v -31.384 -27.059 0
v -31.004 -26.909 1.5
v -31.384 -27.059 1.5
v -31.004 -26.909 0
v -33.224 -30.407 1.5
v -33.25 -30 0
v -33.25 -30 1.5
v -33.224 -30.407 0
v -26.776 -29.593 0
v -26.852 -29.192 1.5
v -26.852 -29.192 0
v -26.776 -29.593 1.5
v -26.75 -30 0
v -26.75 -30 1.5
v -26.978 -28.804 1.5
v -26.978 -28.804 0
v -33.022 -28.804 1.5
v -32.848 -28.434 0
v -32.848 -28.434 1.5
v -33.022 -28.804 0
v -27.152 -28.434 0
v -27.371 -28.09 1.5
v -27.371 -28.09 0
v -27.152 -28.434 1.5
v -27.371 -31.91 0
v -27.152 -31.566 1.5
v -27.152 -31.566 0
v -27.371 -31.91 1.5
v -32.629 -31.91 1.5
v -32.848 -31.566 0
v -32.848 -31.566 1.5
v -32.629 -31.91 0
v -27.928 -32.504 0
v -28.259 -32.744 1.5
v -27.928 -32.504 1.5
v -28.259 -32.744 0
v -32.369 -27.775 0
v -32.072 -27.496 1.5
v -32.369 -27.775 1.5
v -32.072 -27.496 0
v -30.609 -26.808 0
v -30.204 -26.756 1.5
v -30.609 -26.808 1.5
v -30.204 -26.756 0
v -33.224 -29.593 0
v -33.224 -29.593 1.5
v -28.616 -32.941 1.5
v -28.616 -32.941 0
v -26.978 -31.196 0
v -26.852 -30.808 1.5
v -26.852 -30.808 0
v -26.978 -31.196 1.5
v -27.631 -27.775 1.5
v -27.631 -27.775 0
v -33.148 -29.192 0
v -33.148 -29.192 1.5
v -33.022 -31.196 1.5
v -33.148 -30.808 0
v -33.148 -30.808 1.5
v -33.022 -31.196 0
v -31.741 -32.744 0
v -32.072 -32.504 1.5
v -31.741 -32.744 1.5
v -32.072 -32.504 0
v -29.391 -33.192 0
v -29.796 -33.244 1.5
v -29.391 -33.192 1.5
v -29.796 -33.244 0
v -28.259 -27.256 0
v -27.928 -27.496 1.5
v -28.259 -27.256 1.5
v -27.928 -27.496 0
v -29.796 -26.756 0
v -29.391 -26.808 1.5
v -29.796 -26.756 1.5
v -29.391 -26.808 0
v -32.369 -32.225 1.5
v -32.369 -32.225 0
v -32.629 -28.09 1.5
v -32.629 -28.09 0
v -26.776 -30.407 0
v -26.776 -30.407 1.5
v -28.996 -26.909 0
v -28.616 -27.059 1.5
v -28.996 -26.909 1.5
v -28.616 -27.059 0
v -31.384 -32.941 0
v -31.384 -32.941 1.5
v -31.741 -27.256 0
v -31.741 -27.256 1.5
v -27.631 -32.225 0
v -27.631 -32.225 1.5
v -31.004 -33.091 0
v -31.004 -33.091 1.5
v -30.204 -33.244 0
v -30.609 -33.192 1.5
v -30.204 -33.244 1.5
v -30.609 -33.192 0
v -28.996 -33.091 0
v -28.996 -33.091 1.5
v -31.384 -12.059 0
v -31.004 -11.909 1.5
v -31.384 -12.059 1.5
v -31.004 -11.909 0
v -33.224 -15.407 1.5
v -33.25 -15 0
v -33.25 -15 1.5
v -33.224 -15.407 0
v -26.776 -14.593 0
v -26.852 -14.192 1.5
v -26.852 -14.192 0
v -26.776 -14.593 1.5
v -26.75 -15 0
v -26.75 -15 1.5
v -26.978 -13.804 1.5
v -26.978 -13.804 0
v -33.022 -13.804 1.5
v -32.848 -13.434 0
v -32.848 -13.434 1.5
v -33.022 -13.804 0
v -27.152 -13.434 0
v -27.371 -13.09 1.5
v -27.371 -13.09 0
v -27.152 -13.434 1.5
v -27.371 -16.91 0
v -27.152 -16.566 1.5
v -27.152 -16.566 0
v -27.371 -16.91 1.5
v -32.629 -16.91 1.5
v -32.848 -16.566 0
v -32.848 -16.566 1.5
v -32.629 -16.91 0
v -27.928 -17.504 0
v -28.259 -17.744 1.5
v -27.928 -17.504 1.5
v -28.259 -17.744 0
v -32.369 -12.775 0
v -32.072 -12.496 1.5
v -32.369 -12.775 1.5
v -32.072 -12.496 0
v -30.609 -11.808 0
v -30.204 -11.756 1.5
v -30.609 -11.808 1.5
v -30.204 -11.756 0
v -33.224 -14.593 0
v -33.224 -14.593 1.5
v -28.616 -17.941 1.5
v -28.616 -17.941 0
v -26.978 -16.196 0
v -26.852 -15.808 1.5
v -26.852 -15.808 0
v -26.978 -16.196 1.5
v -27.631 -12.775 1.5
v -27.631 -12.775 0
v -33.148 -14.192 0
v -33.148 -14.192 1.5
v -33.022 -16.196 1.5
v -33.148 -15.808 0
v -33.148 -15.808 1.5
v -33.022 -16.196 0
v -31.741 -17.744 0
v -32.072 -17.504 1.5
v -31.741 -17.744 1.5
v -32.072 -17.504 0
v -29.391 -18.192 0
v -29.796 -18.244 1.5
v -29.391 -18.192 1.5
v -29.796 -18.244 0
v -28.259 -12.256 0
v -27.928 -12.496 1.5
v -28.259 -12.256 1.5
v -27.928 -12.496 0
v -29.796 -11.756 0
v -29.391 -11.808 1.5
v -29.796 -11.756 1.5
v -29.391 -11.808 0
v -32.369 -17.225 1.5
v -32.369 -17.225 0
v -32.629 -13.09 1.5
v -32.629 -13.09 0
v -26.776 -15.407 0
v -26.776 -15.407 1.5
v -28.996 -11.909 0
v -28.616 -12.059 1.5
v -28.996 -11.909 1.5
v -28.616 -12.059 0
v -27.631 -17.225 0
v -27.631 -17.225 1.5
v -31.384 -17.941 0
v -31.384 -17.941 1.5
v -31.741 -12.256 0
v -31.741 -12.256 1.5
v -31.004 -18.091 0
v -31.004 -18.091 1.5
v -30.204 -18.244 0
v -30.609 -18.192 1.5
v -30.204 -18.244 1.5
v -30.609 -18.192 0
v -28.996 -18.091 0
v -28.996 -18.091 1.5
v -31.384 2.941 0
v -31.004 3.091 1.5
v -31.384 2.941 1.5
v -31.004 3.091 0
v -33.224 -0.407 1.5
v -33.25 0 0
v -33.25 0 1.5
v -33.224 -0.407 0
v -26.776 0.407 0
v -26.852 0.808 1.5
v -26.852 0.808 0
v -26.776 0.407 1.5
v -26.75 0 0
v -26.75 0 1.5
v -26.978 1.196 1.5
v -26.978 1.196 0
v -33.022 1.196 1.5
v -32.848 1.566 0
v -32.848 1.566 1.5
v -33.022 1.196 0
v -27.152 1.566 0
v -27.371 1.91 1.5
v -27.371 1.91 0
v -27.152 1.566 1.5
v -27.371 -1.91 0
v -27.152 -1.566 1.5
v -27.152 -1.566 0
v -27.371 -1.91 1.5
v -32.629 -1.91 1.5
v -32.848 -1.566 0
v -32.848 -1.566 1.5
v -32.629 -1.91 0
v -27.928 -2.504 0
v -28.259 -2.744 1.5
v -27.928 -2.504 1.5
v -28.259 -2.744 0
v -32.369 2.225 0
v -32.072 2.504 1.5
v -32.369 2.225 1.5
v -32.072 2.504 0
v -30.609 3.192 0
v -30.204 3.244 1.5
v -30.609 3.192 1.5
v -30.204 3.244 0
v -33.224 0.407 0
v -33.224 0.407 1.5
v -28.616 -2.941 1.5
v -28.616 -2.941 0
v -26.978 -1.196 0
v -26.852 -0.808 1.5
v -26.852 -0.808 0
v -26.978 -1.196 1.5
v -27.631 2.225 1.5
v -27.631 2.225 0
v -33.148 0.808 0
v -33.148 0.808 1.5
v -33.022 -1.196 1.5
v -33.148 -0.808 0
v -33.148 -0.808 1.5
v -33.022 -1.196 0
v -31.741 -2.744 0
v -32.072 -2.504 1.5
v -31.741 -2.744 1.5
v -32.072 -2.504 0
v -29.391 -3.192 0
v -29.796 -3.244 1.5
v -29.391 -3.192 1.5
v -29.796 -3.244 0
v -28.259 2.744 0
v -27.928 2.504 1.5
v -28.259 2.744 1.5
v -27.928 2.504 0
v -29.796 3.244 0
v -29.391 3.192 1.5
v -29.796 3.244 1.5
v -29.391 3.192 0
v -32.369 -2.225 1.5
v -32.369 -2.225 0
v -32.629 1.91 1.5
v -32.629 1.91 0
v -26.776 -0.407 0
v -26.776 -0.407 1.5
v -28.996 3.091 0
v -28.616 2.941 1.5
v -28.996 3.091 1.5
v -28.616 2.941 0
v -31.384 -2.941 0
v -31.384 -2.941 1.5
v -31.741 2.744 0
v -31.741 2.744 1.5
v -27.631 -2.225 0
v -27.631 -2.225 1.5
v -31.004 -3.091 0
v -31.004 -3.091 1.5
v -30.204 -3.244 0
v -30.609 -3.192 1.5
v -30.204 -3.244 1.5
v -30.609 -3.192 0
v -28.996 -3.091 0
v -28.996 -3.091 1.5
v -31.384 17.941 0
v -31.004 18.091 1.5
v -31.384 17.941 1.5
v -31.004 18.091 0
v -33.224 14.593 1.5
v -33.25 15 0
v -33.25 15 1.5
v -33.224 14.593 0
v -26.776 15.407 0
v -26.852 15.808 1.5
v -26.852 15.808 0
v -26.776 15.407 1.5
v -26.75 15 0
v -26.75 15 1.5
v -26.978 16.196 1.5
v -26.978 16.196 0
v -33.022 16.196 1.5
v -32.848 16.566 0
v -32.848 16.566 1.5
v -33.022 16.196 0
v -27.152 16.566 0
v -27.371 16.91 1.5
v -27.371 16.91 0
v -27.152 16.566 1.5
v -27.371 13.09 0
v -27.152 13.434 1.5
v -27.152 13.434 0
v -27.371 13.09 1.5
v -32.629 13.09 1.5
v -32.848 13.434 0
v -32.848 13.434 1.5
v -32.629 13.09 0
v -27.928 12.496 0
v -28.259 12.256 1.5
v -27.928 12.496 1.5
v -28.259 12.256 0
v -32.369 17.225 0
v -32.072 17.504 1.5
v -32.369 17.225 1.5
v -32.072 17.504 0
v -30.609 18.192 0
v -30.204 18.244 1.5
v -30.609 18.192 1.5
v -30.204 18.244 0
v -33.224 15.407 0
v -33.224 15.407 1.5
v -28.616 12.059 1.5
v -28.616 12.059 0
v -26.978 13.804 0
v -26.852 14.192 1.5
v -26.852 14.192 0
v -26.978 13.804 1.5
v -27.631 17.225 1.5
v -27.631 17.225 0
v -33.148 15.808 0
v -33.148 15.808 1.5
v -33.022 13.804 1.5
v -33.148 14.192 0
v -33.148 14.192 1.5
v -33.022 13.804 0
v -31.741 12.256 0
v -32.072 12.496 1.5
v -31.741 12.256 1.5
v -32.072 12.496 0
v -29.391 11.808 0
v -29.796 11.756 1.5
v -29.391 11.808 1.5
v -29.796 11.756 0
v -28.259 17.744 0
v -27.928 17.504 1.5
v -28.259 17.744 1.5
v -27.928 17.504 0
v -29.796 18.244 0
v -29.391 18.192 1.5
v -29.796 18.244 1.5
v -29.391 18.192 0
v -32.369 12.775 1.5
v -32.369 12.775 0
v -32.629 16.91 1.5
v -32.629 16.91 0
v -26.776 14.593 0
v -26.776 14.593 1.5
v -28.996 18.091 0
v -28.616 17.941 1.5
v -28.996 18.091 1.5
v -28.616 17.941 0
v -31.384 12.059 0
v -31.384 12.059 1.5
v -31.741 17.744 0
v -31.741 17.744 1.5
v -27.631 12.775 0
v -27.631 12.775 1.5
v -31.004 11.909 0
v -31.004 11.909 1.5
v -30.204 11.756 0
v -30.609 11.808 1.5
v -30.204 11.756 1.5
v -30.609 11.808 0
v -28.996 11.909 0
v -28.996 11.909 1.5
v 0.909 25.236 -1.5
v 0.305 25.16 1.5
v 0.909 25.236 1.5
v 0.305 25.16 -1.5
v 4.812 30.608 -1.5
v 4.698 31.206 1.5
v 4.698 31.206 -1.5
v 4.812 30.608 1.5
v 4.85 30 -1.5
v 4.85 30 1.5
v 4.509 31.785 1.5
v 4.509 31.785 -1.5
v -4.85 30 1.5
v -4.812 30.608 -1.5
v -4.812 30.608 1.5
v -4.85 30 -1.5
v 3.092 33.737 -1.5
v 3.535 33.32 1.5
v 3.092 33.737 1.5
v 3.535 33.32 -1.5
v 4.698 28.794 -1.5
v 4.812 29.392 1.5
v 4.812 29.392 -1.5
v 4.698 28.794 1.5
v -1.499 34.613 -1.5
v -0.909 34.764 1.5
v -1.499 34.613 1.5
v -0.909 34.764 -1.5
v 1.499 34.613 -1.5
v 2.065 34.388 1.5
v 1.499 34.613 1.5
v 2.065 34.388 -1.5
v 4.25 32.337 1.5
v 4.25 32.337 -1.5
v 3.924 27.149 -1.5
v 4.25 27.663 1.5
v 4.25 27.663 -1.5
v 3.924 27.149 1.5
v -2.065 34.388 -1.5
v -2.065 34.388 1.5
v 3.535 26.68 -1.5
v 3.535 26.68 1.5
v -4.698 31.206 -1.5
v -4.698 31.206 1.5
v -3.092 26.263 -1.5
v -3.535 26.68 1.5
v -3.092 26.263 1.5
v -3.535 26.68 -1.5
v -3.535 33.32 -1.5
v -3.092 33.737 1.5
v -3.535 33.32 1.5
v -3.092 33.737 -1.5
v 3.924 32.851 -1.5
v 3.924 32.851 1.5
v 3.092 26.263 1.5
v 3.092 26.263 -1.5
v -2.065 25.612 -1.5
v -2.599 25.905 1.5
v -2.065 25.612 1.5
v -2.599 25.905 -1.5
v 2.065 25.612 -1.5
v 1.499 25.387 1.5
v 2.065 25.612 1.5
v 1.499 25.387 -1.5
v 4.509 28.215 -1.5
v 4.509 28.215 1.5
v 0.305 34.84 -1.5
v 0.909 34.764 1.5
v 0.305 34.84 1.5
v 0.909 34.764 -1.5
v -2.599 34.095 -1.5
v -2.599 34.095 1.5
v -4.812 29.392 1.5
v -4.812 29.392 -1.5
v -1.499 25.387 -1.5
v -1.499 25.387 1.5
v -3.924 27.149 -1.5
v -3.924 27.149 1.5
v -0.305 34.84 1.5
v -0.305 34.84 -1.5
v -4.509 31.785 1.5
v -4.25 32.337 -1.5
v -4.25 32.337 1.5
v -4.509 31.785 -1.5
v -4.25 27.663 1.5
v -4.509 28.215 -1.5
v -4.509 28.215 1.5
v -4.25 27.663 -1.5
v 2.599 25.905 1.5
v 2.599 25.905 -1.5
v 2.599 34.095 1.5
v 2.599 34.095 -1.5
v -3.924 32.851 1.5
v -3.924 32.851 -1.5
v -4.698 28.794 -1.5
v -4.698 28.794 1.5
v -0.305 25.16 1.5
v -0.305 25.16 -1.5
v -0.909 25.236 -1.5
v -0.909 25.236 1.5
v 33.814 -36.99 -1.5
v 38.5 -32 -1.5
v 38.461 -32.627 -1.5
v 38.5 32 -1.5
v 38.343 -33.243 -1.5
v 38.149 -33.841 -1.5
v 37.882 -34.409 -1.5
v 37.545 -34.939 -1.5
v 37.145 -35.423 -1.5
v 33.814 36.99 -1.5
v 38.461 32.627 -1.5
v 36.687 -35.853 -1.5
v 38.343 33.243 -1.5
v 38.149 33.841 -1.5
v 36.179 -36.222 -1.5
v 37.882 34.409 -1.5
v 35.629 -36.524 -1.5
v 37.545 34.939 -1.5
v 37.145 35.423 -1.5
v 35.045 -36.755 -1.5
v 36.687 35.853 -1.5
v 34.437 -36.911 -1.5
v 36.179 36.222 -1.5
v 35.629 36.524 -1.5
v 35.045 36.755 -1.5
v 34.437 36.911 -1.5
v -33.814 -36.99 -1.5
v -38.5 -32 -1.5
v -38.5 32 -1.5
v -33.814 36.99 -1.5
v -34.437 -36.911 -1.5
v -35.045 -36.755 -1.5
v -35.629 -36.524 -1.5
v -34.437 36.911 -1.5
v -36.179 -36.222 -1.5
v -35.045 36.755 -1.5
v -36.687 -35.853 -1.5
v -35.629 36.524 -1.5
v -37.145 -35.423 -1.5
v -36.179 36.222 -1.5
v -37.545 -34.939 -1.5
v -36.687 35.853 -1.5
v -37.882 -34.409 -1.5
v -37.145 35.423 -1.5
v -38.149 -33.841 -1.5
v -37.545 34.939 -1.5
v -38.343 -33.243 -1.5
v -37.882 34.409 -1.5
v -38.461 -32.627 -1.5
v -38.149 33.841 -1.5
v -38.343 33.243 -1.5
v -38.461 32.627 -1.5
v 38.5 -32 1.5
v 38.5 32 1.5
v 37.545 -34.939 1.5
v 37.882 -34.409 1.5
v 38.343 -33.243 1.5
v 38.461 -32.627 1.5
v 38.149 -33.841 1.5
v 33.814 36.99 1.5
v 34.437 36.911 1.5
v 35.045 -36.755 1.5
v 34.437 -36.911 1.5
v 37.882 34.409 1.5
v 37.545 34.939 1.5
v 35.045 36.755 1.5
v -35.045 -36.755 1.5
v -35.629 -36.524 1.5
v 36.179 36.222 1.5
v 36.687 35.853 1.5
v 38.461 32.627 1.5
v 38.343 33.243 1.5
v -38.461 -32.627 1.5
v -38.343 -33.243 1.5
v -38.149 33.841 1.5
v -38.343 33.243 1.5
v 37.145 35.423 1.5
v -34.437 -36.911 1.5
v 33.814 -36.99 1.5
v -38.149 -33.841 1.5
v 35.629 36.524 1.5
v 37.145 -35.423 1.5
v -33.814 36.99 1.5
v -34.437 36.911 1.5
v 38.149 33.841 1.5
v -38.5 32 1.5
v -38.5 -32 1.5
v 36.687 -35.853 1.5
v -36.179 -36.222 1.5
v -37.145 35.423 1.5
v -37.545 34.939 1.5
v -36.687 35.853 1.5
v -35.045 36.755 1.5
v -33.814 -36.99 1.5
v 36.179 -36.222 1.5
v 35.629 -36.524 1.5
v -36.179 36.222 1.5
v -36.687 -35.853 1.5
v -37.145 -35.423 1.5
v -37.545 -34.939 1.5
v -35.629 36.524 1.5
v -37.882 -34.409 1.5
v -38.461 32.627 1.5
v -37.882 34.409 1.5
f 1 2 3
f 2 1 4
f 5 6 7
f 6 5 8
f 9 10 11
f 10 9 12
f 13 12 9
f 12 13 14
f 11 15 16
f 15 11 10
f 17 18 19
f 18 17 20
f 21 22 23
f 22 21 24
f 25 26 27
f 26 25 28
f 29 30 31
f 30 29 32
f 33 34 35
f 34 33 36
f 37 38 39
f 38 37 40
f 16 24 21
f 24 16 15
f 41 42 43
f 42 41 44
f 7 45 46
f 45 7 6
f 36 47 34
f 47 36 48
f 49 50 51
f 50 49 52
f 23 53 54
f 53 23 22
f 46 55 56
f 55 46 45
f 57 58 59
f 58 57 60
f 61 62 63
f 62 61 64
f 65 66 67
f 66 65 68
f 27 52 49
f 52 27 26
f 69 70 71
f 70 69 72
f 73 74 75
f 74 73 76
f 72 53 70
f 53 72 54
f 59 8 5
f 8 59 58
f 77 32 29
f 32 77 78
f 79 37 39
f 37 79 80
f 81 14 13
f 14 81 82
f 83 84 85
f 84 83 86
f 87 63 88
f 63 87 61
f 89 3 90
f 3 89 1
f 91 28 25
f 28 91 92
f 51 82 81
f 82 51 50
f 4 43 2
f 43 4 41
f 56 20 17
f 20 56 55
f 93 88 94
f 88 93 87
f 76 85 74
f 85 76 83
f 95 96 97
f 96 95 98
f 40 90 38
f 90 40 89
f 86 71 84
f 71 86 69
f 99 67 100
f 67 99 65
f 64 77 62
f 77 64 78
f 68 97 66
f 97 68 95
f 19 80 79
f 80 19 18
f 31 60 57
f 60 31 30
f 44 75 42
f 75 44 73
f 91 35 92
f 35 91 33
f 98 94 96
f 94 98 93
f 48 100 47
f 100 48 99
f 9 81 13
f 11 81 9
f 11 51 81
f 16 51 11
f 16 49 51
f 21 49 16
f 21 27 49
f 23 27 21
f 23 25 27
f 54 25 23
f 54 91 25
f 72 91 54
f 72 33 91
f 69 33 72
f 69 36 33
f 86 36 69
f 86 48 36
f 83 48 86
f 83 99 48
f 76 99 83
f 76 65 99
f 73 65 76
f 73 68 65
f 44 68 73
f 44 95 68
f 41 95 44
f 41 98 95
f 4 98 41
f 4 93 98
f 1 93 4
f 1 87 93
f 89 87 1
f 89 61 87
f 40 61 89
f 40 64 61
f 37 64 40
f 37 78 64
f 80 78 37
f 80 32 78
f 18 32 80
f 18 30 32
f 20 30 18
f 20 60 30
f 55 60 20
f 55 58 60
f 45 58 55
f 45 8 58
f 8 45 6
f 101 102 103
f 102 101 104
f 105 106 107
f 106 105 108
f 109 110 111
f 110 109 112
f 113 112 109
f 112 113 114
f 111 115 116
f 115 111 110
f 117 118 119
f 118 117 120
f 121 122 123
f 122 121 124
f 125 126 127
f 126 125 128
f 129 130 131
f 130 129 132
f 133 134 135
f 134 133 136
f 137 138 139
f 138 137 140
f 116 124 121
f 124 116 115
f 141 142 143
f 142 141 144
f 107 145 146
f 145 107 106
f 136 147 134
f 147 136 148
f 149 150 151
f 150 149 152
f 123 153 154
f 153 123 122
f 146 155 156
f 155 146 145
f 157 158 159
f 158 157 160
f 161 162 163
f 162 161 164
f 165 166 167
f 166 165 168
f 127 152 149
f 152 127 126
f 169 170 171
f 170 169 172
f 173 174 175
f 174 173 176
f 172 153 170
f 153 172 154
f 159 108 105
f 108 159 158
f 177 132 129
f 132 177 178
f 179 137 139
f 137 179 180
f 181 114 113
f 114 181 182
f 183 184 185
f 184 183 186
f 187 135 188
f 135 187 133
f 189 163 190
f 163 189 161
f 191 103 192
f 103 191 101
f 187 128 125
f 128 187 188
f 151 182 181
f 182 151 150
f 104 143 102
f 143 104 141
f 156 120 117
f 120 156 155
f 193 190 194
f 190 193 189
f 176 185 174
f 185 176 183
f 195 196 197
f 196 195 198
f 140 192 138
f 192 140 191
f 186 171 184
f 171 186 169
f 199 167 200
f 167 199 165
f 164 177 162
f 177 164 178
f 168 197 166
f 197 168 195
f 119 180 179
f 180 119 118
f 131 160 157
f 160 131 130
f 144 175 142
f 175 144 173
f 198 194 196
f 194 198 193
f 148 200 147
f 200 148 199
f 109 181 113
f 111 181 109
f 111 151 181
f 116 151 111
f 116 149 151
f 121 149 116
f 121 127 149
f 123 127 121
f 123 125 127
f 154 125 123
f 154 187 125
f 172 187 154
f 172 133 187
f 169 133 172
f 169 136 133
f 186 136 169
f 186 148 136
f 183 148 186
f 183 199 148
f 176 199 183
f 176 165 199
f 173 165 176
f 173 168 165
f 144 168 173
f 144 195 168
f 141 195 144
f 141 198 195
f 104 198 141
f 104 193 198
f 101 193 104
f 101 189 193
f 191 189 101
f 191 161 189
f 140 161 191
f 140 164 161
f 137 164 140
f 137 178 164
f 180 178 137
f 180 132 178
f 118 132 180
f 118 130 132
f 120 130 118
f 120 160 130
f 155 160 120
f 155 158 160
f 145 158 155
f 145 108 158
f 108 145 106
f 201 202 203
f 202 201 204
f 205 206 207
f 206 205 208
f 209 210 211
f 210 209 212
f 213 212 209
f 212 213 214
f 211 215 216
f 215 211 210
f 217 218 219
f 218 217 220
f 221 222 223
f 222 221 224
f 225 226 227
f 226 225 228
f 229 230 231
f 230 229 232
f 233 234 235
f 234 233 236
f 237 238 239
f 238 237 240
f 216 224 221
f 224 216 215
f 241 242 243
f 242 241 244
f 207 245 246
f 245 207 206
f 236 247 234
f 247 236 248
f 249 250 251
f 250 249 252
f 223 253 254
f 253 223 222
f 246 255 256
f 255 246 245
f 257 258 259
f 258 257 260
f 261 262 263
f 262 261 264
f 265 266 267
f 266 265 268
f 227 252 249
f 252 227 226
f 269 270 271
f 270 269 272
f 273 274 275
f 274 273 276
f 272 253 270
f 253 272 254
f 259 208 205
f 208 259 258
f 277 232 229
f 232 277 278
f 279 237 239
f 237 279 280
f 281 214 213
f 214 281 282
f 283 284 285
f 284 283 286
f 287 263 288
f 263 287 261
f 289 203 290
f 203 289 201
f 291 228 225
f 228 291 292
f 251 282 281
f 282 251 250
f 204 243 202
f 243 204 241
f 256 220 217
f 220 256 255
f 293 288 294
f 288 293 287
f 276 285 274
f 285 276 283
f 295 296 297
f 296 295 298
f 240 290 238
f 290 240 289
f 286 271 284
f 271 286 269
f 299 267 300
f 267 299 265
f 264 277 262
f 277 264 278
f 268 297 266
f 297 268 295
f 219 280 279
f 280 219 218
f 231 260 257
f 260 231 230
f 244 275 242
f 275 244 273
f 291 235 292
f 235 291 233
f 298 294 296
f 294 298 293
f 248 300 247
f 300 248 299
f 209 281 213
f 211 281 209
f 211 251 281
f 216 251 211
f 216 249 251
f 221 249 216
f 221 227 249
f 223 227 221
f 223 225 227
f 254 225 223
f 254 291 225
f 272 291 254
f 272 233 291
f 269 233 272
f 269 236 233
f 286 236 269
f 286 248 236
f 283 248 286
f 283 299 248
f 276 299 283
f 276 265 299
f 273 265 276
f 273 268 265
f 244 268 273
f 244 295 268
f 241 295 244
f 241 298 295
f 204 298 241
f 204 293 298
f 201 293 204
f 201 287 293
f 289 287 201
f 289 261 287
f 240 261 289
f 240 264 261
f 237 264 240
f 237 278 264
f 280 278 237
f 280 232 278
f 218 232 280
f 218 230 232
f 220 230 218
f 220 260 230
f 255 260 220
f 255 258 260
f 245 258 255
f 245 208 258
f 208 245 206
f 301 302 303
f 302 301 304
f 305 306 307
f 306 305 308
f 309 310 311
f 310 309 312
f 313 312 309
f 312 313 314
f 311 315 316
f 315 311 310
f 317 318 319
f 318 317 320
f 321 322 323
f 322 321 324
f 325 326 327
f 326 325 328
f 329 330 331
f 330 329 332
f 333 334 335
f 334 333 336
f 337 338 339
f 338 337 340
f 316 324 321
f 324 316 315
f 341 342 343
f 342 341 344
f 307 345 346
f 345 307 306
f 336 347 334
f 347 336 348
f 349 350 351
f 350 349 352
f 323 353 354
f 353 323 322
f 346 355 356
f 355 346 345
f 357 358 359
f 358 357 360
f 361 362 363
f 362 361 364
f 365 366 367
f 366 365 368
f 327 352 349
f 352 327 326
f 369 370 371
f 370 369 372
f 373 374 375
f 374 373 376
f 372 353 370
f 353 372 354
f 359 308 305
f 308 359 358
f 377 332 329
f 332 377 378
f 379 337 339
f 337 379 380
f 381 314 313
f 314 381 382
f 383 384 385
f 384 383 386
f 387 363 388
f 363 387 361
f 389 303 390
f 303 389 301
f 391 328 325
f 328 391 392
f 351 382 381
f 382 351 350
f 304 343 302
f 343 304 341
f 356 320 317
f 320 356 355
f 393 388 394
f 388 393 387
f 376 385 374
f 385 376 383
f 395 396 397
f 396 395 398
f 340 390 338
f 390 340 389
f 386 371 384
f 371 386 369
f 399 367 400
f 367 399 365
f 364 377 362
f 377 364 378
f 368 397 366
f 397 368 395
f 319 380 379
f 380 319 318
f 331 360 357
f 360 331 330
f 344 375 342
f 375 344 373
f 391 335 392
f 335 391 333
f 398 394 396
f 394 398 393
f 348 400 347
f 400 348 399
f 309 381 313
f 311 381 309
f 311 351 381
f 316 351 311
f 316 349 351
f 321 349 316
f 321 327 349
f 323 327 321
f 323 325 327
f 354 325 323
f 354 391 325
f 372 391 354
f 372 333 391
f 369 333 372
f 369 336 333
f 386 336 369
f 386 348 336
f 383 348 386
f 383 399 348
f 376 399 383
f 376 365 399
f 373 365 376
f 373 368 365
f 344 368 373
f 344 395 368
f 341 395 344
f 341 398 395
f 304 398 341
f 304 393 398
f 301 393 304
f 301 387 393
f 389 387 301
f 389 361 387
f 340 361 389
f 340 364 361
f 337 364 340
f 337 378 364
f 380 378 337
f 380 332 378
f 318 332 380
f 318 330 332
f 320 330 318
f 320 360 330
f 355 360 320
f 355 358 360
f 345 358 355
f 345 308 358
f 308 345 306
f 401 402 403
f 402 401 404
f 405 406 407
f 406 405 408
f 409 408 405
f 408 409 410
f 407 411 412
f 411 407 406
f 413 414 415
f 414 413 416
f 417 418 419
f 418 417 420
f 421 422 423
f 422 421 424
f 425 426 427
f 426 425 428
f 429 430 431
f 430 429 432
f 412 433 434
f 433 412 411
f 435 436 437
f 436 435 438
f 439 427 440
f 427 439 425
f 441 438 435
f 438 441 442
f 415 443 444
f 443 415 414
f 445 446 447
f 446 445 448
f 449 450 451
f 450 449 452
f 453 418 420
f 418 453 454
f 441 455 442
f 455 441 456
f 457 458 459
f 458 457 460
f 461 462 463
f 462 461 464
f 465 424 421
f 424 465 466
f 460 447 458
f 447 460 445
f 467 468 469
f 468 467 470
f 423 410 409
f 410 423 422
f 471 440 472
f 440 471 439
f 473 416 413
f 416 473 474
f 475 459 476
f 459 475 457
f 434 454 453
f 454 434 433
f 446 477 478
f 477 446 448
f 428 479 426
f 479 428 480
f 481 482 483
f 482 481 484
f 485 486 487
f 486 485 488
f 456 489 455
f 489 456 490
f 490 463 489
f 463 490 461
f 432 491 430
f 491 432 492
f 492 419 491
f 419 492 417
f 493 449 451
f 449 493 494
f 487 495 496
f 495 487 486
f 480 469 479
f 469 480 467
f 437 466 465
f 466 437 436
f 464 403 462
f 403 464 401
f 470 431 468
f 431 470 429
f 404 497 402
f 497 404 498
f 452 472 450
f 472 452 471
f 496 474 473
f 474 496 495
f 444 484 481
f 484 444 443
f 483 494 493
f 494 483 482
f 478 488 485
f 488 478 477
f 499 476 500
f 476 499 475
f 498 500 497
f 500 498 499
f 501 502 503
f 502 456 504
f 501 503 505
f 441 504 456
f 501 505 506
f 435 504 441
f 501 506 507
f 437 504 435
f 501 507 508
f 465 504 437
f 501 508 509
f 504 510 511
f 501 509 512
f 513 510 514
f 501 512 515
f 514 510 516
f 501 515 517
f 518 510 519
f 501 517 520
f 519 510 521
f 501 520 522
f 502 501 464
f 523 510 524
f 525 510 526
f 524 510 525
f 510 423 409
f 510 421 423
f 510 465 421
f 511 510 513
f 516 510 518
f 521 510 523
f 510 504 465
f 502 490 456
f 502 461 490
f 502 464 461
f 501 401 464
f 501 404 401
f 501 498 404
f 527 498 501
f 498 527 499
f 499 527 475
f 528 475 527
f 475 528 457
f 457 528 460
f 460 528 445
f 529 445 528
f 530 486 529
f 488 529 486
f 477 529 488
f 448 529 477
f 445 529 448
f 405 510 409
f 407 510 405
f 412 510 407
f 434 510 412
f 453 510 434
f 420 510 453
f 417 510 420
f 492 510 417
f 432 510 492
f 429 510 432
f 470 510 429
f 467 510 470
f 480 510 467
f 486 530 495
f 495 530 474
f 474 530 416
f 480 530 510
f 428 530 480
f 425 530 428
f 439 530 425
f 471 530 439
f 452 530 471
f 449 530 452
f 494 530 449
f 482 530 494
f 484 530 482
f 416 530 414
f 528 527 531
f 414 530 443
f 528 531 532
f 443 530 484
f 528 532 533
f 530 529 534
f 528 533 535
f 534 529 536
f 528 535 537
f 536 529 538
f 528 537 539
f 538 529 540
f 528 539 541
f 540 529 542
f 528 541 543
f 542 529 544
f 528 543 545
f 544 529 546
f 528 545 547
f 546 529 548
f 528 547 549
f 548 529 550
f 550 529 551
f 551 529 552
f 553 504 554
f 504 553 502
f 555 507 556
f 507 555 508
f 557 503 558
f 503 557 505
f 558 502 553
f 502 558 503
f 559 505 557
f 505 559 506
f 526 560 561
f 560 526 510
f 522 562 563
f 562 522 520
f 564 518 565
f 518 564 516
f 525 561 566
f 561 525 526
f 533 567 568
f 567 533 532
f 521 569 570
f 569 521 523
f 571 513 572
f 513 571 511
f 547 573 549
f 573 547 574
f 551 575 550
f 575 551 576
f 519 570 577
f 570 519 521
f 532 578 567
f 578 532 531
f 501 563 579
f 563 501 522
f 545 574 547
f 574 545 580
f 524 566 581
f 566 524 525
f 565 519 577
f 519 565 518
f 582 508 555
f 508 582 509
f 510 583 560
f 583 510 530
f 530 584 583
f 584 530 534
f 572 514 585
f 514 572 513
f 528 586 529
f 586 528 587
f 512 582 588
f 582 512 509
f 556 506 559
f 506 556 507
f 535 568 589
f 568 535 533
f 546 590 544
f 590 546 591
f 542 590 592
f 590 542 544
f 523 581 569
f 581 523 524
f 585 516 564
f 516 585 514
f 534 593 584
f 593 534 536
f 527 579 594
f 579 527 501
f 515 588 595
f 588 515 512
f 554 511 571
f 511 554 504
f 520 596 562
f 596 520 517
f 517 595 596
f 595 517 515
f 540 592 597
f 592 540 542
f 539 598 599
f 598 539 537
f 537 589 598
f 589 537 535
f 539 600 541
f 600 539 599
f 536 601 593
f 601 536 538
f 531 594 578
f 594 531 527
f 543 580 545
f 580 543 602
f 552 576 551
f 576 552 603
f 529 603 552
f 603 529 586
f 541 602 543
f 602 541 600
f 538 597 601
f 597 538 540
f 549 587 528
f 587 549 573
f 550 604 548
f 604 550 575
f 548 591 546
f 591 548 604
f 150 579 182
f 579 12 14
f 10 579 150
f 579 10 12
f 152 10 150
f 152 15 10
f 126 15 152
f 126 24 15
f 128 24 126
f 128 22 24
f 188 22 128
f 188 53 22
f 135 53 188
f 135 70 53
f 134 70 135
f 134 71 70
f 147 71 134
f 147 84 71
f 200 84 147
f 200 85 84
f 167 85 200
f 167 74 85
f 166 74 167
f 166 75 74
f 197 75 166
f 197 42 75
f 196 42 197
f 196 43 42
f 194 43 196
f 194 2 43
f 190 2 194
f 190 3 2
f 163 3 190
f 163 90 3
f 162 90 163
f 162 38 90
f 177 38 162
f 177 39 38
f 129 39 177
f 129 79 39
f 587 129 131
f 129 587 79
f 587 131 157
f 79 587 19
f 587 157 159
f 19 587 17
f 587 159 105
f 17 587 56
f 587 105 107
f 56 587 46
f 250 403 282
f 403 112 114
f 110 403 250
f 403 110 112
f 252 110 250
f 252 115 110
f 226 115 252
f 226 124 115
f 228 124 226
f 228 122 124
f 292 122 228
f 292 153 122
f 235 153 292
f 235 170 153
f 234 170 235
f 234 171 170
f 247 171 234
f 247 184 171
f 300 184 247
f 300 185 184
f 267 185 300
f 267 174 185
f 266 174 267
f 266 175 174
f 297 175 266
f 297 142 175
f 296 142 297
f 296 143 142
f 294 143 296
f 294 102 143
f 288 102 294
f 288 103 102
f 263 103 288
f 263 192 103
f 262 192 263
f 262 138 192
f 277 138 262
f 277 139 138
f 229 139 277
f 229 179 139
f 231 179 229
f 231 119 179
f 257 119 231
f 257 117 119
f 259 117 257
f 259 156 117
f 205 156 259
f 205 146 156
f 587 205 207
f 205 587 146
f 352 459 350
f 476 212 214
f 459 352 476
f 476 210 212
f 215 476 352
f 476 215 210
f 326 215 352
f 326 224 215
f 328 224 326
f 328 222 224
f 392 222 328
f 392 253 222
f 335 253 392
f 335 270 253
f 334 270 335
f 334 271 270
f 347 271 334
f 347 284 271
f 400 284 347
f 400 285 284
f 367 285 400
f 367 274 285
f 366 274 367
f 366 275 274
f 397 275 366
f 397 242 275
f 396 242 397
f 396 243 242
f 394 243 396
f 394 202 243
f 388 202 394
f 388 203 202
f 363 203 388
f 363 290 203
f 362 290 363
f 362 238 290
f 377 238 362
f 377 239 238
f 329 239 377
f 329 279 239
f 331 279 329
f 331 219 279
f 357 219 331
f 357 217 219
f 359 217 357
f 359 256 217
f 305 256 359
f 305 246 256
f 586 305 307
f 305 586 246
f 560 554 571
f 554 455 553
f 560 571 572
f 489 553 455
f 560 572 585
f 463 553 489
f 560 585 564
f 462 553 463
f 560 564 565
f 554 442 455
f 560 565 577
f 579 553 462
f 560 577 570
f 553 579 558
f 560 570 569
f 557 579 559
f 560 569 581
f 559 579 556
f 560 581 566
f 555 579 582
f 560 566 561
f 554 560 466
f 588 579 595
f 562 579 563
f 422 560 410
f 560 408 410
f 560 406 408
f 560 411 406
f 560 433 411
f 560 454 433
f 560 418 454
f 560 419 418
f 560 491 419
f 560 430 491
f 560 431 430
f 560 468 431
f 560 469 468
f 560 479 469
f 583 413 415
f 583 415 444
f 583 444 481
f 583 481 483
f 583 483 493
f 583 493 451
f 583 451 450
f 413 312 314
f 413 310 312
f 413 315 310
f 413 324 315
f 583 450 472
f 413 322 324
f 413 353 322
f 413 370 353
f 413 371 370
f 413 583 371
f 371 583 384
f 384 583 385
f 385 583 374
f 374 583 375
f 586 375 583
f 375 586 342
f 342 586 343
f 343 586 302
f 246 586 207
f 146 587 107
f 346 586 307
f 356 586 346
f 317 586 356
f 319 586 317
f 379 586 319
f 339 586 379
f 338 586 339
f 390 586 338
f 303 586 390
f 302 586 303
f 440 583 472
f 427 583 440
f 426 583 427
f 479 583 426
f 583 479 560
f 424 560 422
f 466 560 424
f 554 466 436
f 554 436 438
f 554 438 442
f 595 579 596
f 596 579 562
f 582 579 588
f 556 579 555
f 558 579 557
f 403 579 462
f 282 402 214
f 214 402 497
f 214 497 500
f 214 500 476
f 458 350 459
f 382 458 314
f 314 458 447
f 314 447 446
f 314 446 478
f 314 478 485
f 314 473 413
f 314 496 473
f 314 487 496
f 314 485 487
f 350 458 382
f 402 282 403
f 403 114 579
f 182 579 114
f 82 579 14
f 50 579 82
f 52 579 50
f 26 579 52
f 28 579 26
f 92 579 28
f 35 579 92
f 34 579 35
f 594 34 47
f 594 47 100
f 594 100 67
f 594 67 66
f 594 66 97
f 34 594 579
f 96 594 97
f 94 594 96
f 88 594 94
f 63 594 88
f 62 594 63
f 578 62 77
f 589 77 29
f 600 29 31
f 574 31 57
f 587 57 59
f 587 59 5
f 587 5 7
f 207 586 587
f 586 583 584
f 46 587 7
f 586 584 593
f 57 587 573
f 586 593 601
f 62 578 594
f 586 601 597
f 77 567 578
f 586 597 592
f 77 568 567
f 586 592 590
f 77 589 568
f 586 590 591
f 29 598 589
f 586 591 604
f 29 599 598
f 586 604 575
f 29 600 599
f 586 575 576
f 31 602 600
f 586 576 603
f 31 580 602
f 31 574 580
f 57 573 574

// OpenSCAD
$fn = 50;


difference() {
	union() {
		translate(v = [0, 0, -1.5000000000]) {
			hull() {
				translate(v = [-33.5000000000, 32.0000000000, 0]) {
					cylinder(h = 3, r = 5);
				}
				translate(v = [33.5000000000, 32.0000000000, 0]) {
					cylinder(h = 3, r = 5);
				}
				translate(v = [-33.5000000000, -32.0000000000, 0]) {
					cylinder(h = 3, r = 5);
				}
				translate(v = [33.5000000000, -32.0000000000, 0]) {
					cylinder(h = 3, r = 5);
				}
			}
		}
	}
	union() {
		translate(v = [-30.0000000000, -30.0000000000, 0]) {
			cylinder(h = 100, r = 3.2500000000);
		}
		translate(v = [-30.0000000000, -15.0000000000, 0]) {
			cylinder(h = 100, r = 3.2500000000);
		}
		translate(v = [-30.0000000000, 0.0000000000, 0]) {
			cylinder(h = 100, r = 3.2500000000);
		}
		translate(v = [-30.0000000000, 15.0000000000, 0]) {
			cylinder(h = 100, r = 3.2500000000);
		}
		translate(v = [0, 30, -100.0000000000]) {
			cylinder(h = 200, r = 4.8500000000);
		}
	}
}
